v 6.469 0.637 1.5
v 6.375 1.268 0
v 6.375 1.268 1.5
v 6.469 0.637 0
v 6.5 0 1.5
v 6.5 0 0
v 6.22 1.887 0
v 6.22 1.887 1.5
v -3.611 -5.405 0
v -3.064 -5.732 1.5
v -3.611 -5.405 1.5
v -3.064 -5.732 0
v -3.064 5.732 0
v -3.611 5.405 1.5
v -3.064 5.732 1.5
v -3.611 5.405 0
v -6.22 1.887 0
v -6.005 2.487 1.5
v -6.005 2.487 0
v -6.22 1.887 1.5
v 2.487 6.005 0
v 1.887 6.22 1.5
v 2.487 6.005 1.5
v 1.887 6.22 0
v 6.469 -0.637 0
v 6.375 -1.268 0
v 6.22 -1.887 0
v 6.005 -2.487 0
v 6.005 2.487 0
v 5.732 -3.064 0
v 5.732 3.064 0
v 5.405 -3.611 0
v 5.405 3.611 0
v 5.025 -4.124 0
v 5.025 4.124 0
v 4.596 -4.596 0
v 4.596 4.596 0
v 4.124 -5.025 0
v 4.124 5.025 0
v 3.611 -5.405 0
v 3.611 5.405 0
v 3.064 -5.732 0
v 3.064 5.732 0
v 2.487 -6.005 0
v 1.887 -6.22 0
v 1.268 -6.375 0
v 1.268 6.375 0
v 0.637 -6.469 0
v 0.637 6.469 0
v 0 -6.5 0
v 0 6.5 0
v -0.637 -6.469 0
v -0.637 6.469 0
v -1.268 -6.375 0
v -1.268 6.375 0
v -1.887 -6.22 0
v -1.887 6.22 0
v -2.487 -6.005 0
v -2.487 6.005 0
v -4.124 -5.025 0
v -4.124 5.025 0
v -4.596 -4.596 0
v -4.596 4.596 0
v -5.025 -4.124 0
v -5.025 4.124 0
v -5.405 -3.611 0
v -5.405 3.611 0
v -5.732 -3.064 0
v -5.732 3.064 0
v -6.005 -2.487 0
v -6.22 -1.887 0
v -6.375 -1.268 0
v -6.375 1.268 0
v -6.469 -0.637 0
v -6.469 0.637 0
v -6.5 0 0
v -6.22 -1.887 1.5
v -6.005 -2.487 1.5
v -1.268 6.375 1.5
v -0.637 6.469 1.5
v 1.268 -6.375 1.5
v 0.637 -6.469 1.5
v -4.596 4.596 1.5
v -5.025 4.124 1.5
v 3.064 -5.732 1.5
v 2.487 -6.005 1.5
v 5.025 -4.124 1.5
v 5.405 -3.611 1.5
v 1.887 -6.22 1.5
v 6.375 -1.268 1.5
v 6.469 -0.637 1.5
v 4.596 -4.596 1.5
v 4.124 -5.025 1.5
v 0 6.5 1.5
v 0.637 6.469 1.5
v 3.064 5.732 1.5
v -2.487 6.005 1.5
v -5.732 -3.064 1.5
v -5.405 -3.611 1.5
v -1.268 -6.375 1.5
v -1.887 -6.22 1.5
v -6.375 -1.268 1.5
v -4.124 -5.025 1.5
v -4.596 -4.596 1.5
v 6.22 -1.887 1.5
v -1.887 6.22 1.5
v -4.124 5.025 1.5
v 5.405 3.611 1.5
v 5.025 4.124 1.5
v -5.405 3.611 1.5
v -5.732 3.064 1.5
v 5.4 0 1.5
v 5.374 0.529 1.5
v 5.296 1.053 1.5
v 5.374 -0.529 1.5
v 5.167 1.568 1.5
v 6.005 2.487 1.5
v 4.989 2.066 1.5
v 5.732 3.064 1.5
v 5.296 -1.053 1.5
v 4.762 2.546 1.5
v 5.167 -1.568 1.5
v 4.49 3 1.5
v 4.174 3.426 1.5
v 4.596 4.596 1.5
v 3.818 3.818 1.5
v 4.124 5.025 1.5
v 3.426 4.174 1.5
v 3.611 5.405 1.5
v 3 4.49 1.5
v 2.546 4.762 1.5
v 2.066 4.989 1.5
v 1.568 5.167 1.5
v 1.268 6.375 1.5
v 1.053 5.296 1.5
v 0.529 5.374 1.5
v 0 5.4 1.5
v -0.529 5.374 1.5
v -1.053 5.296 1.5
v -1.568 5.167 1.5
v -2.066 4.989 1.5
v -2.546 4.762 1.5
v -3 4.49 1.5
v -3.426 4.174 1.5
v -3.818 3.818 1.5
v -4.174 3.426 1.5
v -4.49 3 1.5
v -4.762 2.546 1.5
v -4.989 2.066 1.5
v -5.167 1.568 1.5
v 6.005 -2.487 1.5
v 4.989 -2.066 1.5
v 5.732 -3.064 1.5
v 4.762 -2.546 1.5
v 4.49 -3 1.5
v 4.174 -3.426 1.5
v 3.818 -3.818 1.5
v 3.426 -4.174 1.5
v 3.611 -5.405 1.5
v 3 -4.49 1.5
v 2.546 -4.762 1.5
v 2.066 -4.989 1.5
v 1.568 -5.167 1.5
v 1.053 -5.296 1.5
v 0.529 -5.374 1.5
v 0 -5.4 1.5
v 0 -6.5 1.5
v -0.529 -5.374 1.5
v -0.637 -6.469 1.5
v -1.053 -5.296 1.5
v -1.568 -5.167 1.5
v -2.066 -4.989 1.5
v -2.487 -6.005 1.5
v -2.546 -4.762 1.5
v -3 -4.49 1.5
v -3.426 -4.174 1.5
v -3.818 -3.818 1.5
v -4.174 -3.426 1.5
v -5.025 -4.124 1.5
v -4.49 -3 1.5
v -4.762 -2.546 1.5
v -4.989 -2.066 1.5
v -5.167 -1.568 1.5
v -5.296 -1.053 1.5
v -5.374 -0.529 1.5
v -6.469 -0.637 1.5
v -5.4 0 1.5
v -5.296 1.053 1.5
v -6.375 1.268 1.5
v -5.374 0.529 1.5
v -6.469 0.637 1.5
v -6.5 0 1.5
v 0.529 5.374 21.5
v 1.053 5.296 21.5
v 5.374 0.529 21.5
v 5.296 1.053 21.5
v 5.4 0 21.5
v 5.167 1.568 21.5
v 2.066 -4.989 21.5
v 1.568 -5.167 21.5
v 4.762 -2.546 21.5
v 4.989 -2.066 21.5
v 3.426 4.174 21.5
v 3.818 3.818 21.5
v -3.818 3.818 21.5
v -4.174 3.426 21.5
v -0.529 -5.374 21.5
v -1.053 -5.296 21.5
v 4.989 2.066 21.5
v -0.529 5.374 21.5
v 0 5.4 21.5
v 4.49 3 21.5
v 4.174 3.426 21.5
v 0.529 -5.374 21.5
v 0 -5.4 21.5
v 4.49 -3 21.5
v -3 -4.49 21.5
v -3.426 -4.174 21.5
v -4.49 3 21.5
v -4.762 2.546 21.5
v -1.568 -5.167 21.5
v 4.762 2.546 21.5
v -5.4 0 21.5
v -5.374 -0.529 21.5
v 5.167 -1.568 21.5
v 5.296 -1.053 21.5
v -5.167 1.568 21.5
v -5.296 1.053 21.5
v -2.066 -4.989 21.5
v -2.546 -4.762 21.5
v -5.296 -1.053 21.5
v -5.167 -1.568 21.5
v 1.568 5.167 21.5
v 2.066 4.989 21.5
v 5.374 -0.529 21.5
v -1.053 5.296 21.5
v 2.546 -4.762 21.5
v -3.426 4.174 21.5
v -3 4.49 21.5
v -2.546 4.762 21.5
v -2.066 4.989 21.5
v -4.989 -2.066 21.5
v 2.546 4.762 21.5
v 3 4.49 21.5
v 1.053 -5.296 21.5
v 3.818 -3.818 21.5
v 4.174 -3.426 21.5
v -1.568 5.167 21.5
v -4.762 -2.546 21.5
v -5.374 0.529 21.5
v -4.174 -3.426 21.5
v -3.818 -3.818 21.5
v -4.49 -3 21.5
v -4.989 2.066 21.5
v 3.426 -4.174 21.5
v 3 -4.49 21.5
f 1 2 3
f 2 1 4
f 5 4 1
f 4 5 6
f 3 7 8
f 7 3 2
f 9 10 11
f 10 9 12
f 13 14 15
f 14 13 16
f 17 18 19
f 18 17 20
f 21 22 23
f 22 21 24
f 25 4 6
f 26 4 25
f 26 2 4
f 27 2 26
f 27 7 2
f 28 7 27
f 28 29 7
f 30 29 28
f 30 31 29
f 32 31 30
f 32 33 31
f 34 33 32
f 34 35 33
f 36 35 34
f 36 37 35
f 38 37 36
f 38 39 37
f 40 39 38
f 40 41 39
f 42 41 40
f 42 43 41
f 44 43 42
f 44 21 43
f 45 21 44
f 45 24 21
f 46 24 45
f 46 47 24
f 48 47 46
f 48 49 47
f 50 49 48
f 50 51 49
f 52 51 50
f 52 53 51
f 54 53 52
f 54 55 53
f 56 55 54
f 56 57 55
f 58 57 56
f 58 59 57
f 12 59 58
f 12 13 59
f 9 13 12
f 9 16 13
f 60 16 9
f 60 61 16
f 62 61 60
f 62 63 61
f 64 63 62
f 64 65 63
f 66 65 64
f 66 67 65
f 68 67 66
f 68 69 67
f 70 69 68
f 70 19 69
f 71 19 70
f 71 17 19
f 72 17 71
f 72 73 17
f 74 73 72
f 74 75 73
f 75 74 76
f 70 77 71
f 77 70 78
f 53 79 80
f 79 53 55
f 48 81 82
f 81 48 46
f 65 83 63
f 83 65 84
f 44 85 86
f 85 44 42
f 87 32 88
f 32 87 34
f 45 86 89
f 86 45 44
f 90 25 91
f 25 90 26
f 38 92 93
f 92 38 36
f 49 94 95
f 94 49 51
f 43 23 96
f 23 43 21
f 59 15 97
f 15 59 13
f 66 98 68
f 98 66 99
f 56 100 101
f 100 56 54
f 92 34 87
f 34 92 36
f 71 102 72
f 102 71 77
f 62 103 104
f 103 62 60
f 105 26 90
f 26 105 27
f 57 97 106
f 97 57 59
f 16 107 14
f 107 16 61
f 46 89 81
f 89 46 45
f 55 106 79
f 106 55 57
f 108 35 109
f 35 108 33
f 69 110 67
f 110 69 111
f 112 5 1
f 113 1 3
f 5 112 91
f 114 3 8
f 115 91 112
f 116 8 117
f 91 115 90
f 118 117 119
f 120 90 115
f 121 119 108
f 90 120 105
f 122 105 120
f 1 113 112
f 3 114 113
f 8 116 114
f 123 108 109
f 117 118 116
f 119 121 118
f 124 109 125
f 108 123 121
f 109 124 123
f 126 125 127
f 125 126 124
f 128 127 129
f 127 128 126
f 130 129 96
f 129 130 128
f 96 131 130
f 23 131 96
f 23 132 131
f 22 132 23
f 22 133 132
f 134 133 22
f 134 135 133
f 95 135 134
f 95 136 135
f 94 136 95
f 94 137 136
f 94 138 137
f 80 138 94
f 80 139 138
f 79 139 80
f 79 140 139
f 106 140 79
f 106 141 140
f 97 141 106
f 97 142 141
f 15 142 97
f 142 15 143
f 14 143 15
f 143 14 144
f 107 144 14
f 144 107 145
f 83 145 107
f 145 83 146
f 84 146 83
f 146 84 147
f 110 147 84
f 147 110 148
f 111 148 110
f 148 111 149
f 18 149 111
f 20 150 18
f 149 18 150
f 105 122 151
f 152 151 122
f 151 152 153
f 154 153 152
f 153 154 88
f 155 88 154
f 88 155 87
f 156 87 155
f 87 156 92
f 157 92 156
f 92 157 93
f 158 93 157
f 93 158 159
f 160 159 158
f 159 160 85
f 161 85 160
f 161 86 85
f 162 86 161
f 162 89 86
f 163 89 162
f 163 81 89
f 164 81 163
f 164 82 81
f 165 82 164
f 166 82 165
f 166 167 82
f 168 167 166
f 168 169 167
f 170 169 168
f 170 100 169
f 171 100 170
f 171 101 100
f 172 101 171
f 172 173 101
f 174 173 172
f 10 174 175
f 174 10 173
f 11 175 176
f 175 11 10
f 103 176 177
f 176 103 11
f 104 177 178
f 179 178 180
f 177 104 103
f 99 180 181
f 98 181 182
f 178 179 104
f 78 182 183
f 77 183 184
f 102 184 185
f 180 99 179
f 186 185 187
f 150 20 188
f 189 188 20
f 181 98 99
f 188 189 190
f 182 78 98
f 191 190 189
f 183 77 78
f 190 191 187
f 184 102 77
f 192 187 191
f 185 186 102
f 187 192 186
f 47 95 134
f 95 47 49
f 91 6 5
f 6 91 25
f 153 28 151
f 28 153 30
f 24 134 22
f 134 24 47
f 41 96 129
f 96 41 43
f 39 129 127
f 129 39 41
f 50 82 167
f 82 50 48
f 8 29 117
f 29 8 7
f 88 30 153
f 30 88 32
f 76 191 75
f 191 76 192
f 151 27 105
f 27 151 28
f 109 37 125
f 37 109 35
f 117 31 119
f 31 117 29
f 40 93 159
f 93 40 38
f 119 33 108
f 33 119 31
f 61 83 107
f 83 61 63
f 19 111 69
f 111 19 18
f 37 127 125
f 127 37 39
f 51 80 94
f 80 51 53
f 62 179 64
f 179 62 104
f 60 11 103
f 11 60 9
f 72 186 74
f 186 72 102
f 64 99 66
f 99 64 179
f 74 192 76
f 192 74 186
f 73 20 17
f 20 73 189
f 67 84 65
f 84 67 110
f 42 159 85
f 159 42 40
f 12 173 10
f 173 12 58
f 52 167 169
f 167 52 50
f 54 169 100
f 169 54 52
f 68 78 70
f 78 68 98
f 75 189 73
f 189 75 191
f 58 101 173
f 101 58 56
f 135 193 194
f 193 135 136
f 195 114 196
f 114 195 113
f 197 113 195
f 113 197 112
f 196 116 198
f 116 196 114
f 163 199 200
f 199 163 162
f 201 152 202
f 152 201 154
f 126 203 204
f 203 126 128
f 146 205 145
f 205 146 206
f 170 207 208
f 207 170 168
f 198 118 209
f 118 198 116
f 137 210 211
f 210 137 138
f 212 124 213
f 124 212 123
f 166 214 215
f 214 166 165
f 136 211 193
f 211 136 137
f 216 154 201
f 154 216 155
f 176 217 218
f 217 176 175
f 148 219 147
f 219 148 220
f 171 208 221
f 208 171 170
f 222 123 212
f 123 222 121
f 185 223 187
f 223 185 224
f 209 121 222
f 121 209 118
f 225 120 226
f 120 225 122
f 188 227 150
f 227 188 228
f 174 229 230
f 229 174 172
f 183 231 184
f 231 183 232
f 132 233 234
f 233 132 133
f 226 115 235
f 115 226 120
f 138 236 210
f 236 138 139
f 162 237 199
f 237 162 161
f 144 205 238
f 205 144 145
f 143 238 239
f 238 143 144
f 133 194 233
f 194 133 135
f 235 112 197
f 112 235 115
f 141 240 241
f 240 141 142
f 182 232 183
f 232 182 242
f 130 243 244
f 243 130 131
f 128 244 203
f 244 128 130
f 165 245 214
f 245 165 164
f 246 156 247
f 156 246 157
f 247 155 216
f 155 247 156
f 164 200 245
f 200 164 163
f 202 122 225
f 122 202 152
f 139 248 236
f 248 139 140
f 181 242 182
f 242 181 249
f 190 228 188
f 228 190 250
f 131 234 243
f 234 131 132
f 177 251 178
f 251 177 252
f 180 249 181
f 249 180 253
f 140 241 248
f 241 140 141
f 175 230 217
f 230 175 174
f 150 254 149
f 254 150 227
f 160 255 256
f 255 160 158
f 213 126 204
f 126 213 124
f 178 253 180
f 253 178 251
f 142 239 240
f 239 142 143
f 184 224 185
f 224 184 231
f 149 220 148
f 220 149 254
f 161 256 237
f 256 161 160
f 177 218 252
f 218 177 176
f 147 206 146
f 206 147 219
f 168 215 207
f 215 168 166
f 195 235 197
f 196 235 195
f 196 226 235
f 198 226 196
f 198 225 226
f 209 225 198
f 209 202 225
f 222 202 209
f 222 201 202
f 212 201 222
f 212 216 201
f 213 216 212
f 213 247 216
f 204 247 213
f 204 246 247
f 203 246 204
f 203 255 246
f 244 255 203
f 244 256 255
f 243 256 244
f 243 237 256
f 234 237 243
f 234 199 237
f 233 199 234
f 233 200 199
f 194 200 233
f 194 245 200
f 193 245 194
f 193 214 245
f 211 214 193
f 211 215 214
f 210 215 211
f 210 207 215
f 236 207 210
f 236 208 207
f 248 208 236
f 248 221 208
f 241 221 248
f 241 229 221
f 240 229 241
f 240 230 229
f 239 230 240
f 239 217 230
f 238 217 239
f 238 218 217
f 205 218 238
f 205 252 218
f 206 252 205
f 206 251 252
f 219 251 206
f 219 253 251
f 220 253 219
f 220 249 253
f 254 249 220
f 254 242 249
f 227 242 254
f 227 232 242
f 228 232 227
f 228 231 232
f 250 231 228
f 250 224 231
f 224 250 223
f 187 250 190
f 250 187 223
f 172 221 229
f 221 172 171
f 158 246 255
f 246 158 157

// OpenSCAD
// Adapter sleeve: 0.2 mL PCR tube in a 1.5 mL tube rack hole
// Print orientation: collar on the bed (z=0..1.5), sleeve rises to z=21.5

$fn = 64;

// Named dimensions (mm)
collar_diameter = 13.0;    // outer diameter of the bed-side collar
collar_thickness = 1.5;    // collar height (z = 0 to 1.5)
sleeve_outer_diameter = 10.8; // outer diameter of the sleeve body
sleeve_top_z = 21.5;       // top of the sleeve body
bore_diameter = 6.2;       // through-bore diameter, open at both ends
cut_overhang = 0.05;       // cutting shapes extend past faces to avoid coplanar faces

// Derived values
collar_radius = collar_diameter / 2;
sleeve_radius = sleeve_outer_diameter / 2;
bore_radius = bore_diameter / 2;

// Build the solid: collar + sleeve body, then subtract the through-bore
union() {
    // Collar: flat disc on the bed
    cylinder(h = collar_thickness, d = collar_diameter, center = false);

    // Sleeve body: from top of collar up to z = 21.5
    translate([0, 0, collar_thickness])
        cylinder(h = sleeve_top_z - collar_thickness, d = sleeve_outer_diameter, center = false);
}

// Subtract the straight through-bore (open at both ends)
difference() {
    union() {
        cylinder(h = collar_thickness, d = collar_diameter, center = false);
        translate([0, 0, collar_thickness])
            cylinder(h = sleeve_top_z - collar_thickness, d = sleeve_outer_diameter, center = false);
    }

    // Bore: extends 0.05 mm past both open ends
    translate([0, 0, -cut_overhang])
        cylinder(h = sleeve_top_z + 2 * cut_overhang, d = bore_diameter, center = false);
}
